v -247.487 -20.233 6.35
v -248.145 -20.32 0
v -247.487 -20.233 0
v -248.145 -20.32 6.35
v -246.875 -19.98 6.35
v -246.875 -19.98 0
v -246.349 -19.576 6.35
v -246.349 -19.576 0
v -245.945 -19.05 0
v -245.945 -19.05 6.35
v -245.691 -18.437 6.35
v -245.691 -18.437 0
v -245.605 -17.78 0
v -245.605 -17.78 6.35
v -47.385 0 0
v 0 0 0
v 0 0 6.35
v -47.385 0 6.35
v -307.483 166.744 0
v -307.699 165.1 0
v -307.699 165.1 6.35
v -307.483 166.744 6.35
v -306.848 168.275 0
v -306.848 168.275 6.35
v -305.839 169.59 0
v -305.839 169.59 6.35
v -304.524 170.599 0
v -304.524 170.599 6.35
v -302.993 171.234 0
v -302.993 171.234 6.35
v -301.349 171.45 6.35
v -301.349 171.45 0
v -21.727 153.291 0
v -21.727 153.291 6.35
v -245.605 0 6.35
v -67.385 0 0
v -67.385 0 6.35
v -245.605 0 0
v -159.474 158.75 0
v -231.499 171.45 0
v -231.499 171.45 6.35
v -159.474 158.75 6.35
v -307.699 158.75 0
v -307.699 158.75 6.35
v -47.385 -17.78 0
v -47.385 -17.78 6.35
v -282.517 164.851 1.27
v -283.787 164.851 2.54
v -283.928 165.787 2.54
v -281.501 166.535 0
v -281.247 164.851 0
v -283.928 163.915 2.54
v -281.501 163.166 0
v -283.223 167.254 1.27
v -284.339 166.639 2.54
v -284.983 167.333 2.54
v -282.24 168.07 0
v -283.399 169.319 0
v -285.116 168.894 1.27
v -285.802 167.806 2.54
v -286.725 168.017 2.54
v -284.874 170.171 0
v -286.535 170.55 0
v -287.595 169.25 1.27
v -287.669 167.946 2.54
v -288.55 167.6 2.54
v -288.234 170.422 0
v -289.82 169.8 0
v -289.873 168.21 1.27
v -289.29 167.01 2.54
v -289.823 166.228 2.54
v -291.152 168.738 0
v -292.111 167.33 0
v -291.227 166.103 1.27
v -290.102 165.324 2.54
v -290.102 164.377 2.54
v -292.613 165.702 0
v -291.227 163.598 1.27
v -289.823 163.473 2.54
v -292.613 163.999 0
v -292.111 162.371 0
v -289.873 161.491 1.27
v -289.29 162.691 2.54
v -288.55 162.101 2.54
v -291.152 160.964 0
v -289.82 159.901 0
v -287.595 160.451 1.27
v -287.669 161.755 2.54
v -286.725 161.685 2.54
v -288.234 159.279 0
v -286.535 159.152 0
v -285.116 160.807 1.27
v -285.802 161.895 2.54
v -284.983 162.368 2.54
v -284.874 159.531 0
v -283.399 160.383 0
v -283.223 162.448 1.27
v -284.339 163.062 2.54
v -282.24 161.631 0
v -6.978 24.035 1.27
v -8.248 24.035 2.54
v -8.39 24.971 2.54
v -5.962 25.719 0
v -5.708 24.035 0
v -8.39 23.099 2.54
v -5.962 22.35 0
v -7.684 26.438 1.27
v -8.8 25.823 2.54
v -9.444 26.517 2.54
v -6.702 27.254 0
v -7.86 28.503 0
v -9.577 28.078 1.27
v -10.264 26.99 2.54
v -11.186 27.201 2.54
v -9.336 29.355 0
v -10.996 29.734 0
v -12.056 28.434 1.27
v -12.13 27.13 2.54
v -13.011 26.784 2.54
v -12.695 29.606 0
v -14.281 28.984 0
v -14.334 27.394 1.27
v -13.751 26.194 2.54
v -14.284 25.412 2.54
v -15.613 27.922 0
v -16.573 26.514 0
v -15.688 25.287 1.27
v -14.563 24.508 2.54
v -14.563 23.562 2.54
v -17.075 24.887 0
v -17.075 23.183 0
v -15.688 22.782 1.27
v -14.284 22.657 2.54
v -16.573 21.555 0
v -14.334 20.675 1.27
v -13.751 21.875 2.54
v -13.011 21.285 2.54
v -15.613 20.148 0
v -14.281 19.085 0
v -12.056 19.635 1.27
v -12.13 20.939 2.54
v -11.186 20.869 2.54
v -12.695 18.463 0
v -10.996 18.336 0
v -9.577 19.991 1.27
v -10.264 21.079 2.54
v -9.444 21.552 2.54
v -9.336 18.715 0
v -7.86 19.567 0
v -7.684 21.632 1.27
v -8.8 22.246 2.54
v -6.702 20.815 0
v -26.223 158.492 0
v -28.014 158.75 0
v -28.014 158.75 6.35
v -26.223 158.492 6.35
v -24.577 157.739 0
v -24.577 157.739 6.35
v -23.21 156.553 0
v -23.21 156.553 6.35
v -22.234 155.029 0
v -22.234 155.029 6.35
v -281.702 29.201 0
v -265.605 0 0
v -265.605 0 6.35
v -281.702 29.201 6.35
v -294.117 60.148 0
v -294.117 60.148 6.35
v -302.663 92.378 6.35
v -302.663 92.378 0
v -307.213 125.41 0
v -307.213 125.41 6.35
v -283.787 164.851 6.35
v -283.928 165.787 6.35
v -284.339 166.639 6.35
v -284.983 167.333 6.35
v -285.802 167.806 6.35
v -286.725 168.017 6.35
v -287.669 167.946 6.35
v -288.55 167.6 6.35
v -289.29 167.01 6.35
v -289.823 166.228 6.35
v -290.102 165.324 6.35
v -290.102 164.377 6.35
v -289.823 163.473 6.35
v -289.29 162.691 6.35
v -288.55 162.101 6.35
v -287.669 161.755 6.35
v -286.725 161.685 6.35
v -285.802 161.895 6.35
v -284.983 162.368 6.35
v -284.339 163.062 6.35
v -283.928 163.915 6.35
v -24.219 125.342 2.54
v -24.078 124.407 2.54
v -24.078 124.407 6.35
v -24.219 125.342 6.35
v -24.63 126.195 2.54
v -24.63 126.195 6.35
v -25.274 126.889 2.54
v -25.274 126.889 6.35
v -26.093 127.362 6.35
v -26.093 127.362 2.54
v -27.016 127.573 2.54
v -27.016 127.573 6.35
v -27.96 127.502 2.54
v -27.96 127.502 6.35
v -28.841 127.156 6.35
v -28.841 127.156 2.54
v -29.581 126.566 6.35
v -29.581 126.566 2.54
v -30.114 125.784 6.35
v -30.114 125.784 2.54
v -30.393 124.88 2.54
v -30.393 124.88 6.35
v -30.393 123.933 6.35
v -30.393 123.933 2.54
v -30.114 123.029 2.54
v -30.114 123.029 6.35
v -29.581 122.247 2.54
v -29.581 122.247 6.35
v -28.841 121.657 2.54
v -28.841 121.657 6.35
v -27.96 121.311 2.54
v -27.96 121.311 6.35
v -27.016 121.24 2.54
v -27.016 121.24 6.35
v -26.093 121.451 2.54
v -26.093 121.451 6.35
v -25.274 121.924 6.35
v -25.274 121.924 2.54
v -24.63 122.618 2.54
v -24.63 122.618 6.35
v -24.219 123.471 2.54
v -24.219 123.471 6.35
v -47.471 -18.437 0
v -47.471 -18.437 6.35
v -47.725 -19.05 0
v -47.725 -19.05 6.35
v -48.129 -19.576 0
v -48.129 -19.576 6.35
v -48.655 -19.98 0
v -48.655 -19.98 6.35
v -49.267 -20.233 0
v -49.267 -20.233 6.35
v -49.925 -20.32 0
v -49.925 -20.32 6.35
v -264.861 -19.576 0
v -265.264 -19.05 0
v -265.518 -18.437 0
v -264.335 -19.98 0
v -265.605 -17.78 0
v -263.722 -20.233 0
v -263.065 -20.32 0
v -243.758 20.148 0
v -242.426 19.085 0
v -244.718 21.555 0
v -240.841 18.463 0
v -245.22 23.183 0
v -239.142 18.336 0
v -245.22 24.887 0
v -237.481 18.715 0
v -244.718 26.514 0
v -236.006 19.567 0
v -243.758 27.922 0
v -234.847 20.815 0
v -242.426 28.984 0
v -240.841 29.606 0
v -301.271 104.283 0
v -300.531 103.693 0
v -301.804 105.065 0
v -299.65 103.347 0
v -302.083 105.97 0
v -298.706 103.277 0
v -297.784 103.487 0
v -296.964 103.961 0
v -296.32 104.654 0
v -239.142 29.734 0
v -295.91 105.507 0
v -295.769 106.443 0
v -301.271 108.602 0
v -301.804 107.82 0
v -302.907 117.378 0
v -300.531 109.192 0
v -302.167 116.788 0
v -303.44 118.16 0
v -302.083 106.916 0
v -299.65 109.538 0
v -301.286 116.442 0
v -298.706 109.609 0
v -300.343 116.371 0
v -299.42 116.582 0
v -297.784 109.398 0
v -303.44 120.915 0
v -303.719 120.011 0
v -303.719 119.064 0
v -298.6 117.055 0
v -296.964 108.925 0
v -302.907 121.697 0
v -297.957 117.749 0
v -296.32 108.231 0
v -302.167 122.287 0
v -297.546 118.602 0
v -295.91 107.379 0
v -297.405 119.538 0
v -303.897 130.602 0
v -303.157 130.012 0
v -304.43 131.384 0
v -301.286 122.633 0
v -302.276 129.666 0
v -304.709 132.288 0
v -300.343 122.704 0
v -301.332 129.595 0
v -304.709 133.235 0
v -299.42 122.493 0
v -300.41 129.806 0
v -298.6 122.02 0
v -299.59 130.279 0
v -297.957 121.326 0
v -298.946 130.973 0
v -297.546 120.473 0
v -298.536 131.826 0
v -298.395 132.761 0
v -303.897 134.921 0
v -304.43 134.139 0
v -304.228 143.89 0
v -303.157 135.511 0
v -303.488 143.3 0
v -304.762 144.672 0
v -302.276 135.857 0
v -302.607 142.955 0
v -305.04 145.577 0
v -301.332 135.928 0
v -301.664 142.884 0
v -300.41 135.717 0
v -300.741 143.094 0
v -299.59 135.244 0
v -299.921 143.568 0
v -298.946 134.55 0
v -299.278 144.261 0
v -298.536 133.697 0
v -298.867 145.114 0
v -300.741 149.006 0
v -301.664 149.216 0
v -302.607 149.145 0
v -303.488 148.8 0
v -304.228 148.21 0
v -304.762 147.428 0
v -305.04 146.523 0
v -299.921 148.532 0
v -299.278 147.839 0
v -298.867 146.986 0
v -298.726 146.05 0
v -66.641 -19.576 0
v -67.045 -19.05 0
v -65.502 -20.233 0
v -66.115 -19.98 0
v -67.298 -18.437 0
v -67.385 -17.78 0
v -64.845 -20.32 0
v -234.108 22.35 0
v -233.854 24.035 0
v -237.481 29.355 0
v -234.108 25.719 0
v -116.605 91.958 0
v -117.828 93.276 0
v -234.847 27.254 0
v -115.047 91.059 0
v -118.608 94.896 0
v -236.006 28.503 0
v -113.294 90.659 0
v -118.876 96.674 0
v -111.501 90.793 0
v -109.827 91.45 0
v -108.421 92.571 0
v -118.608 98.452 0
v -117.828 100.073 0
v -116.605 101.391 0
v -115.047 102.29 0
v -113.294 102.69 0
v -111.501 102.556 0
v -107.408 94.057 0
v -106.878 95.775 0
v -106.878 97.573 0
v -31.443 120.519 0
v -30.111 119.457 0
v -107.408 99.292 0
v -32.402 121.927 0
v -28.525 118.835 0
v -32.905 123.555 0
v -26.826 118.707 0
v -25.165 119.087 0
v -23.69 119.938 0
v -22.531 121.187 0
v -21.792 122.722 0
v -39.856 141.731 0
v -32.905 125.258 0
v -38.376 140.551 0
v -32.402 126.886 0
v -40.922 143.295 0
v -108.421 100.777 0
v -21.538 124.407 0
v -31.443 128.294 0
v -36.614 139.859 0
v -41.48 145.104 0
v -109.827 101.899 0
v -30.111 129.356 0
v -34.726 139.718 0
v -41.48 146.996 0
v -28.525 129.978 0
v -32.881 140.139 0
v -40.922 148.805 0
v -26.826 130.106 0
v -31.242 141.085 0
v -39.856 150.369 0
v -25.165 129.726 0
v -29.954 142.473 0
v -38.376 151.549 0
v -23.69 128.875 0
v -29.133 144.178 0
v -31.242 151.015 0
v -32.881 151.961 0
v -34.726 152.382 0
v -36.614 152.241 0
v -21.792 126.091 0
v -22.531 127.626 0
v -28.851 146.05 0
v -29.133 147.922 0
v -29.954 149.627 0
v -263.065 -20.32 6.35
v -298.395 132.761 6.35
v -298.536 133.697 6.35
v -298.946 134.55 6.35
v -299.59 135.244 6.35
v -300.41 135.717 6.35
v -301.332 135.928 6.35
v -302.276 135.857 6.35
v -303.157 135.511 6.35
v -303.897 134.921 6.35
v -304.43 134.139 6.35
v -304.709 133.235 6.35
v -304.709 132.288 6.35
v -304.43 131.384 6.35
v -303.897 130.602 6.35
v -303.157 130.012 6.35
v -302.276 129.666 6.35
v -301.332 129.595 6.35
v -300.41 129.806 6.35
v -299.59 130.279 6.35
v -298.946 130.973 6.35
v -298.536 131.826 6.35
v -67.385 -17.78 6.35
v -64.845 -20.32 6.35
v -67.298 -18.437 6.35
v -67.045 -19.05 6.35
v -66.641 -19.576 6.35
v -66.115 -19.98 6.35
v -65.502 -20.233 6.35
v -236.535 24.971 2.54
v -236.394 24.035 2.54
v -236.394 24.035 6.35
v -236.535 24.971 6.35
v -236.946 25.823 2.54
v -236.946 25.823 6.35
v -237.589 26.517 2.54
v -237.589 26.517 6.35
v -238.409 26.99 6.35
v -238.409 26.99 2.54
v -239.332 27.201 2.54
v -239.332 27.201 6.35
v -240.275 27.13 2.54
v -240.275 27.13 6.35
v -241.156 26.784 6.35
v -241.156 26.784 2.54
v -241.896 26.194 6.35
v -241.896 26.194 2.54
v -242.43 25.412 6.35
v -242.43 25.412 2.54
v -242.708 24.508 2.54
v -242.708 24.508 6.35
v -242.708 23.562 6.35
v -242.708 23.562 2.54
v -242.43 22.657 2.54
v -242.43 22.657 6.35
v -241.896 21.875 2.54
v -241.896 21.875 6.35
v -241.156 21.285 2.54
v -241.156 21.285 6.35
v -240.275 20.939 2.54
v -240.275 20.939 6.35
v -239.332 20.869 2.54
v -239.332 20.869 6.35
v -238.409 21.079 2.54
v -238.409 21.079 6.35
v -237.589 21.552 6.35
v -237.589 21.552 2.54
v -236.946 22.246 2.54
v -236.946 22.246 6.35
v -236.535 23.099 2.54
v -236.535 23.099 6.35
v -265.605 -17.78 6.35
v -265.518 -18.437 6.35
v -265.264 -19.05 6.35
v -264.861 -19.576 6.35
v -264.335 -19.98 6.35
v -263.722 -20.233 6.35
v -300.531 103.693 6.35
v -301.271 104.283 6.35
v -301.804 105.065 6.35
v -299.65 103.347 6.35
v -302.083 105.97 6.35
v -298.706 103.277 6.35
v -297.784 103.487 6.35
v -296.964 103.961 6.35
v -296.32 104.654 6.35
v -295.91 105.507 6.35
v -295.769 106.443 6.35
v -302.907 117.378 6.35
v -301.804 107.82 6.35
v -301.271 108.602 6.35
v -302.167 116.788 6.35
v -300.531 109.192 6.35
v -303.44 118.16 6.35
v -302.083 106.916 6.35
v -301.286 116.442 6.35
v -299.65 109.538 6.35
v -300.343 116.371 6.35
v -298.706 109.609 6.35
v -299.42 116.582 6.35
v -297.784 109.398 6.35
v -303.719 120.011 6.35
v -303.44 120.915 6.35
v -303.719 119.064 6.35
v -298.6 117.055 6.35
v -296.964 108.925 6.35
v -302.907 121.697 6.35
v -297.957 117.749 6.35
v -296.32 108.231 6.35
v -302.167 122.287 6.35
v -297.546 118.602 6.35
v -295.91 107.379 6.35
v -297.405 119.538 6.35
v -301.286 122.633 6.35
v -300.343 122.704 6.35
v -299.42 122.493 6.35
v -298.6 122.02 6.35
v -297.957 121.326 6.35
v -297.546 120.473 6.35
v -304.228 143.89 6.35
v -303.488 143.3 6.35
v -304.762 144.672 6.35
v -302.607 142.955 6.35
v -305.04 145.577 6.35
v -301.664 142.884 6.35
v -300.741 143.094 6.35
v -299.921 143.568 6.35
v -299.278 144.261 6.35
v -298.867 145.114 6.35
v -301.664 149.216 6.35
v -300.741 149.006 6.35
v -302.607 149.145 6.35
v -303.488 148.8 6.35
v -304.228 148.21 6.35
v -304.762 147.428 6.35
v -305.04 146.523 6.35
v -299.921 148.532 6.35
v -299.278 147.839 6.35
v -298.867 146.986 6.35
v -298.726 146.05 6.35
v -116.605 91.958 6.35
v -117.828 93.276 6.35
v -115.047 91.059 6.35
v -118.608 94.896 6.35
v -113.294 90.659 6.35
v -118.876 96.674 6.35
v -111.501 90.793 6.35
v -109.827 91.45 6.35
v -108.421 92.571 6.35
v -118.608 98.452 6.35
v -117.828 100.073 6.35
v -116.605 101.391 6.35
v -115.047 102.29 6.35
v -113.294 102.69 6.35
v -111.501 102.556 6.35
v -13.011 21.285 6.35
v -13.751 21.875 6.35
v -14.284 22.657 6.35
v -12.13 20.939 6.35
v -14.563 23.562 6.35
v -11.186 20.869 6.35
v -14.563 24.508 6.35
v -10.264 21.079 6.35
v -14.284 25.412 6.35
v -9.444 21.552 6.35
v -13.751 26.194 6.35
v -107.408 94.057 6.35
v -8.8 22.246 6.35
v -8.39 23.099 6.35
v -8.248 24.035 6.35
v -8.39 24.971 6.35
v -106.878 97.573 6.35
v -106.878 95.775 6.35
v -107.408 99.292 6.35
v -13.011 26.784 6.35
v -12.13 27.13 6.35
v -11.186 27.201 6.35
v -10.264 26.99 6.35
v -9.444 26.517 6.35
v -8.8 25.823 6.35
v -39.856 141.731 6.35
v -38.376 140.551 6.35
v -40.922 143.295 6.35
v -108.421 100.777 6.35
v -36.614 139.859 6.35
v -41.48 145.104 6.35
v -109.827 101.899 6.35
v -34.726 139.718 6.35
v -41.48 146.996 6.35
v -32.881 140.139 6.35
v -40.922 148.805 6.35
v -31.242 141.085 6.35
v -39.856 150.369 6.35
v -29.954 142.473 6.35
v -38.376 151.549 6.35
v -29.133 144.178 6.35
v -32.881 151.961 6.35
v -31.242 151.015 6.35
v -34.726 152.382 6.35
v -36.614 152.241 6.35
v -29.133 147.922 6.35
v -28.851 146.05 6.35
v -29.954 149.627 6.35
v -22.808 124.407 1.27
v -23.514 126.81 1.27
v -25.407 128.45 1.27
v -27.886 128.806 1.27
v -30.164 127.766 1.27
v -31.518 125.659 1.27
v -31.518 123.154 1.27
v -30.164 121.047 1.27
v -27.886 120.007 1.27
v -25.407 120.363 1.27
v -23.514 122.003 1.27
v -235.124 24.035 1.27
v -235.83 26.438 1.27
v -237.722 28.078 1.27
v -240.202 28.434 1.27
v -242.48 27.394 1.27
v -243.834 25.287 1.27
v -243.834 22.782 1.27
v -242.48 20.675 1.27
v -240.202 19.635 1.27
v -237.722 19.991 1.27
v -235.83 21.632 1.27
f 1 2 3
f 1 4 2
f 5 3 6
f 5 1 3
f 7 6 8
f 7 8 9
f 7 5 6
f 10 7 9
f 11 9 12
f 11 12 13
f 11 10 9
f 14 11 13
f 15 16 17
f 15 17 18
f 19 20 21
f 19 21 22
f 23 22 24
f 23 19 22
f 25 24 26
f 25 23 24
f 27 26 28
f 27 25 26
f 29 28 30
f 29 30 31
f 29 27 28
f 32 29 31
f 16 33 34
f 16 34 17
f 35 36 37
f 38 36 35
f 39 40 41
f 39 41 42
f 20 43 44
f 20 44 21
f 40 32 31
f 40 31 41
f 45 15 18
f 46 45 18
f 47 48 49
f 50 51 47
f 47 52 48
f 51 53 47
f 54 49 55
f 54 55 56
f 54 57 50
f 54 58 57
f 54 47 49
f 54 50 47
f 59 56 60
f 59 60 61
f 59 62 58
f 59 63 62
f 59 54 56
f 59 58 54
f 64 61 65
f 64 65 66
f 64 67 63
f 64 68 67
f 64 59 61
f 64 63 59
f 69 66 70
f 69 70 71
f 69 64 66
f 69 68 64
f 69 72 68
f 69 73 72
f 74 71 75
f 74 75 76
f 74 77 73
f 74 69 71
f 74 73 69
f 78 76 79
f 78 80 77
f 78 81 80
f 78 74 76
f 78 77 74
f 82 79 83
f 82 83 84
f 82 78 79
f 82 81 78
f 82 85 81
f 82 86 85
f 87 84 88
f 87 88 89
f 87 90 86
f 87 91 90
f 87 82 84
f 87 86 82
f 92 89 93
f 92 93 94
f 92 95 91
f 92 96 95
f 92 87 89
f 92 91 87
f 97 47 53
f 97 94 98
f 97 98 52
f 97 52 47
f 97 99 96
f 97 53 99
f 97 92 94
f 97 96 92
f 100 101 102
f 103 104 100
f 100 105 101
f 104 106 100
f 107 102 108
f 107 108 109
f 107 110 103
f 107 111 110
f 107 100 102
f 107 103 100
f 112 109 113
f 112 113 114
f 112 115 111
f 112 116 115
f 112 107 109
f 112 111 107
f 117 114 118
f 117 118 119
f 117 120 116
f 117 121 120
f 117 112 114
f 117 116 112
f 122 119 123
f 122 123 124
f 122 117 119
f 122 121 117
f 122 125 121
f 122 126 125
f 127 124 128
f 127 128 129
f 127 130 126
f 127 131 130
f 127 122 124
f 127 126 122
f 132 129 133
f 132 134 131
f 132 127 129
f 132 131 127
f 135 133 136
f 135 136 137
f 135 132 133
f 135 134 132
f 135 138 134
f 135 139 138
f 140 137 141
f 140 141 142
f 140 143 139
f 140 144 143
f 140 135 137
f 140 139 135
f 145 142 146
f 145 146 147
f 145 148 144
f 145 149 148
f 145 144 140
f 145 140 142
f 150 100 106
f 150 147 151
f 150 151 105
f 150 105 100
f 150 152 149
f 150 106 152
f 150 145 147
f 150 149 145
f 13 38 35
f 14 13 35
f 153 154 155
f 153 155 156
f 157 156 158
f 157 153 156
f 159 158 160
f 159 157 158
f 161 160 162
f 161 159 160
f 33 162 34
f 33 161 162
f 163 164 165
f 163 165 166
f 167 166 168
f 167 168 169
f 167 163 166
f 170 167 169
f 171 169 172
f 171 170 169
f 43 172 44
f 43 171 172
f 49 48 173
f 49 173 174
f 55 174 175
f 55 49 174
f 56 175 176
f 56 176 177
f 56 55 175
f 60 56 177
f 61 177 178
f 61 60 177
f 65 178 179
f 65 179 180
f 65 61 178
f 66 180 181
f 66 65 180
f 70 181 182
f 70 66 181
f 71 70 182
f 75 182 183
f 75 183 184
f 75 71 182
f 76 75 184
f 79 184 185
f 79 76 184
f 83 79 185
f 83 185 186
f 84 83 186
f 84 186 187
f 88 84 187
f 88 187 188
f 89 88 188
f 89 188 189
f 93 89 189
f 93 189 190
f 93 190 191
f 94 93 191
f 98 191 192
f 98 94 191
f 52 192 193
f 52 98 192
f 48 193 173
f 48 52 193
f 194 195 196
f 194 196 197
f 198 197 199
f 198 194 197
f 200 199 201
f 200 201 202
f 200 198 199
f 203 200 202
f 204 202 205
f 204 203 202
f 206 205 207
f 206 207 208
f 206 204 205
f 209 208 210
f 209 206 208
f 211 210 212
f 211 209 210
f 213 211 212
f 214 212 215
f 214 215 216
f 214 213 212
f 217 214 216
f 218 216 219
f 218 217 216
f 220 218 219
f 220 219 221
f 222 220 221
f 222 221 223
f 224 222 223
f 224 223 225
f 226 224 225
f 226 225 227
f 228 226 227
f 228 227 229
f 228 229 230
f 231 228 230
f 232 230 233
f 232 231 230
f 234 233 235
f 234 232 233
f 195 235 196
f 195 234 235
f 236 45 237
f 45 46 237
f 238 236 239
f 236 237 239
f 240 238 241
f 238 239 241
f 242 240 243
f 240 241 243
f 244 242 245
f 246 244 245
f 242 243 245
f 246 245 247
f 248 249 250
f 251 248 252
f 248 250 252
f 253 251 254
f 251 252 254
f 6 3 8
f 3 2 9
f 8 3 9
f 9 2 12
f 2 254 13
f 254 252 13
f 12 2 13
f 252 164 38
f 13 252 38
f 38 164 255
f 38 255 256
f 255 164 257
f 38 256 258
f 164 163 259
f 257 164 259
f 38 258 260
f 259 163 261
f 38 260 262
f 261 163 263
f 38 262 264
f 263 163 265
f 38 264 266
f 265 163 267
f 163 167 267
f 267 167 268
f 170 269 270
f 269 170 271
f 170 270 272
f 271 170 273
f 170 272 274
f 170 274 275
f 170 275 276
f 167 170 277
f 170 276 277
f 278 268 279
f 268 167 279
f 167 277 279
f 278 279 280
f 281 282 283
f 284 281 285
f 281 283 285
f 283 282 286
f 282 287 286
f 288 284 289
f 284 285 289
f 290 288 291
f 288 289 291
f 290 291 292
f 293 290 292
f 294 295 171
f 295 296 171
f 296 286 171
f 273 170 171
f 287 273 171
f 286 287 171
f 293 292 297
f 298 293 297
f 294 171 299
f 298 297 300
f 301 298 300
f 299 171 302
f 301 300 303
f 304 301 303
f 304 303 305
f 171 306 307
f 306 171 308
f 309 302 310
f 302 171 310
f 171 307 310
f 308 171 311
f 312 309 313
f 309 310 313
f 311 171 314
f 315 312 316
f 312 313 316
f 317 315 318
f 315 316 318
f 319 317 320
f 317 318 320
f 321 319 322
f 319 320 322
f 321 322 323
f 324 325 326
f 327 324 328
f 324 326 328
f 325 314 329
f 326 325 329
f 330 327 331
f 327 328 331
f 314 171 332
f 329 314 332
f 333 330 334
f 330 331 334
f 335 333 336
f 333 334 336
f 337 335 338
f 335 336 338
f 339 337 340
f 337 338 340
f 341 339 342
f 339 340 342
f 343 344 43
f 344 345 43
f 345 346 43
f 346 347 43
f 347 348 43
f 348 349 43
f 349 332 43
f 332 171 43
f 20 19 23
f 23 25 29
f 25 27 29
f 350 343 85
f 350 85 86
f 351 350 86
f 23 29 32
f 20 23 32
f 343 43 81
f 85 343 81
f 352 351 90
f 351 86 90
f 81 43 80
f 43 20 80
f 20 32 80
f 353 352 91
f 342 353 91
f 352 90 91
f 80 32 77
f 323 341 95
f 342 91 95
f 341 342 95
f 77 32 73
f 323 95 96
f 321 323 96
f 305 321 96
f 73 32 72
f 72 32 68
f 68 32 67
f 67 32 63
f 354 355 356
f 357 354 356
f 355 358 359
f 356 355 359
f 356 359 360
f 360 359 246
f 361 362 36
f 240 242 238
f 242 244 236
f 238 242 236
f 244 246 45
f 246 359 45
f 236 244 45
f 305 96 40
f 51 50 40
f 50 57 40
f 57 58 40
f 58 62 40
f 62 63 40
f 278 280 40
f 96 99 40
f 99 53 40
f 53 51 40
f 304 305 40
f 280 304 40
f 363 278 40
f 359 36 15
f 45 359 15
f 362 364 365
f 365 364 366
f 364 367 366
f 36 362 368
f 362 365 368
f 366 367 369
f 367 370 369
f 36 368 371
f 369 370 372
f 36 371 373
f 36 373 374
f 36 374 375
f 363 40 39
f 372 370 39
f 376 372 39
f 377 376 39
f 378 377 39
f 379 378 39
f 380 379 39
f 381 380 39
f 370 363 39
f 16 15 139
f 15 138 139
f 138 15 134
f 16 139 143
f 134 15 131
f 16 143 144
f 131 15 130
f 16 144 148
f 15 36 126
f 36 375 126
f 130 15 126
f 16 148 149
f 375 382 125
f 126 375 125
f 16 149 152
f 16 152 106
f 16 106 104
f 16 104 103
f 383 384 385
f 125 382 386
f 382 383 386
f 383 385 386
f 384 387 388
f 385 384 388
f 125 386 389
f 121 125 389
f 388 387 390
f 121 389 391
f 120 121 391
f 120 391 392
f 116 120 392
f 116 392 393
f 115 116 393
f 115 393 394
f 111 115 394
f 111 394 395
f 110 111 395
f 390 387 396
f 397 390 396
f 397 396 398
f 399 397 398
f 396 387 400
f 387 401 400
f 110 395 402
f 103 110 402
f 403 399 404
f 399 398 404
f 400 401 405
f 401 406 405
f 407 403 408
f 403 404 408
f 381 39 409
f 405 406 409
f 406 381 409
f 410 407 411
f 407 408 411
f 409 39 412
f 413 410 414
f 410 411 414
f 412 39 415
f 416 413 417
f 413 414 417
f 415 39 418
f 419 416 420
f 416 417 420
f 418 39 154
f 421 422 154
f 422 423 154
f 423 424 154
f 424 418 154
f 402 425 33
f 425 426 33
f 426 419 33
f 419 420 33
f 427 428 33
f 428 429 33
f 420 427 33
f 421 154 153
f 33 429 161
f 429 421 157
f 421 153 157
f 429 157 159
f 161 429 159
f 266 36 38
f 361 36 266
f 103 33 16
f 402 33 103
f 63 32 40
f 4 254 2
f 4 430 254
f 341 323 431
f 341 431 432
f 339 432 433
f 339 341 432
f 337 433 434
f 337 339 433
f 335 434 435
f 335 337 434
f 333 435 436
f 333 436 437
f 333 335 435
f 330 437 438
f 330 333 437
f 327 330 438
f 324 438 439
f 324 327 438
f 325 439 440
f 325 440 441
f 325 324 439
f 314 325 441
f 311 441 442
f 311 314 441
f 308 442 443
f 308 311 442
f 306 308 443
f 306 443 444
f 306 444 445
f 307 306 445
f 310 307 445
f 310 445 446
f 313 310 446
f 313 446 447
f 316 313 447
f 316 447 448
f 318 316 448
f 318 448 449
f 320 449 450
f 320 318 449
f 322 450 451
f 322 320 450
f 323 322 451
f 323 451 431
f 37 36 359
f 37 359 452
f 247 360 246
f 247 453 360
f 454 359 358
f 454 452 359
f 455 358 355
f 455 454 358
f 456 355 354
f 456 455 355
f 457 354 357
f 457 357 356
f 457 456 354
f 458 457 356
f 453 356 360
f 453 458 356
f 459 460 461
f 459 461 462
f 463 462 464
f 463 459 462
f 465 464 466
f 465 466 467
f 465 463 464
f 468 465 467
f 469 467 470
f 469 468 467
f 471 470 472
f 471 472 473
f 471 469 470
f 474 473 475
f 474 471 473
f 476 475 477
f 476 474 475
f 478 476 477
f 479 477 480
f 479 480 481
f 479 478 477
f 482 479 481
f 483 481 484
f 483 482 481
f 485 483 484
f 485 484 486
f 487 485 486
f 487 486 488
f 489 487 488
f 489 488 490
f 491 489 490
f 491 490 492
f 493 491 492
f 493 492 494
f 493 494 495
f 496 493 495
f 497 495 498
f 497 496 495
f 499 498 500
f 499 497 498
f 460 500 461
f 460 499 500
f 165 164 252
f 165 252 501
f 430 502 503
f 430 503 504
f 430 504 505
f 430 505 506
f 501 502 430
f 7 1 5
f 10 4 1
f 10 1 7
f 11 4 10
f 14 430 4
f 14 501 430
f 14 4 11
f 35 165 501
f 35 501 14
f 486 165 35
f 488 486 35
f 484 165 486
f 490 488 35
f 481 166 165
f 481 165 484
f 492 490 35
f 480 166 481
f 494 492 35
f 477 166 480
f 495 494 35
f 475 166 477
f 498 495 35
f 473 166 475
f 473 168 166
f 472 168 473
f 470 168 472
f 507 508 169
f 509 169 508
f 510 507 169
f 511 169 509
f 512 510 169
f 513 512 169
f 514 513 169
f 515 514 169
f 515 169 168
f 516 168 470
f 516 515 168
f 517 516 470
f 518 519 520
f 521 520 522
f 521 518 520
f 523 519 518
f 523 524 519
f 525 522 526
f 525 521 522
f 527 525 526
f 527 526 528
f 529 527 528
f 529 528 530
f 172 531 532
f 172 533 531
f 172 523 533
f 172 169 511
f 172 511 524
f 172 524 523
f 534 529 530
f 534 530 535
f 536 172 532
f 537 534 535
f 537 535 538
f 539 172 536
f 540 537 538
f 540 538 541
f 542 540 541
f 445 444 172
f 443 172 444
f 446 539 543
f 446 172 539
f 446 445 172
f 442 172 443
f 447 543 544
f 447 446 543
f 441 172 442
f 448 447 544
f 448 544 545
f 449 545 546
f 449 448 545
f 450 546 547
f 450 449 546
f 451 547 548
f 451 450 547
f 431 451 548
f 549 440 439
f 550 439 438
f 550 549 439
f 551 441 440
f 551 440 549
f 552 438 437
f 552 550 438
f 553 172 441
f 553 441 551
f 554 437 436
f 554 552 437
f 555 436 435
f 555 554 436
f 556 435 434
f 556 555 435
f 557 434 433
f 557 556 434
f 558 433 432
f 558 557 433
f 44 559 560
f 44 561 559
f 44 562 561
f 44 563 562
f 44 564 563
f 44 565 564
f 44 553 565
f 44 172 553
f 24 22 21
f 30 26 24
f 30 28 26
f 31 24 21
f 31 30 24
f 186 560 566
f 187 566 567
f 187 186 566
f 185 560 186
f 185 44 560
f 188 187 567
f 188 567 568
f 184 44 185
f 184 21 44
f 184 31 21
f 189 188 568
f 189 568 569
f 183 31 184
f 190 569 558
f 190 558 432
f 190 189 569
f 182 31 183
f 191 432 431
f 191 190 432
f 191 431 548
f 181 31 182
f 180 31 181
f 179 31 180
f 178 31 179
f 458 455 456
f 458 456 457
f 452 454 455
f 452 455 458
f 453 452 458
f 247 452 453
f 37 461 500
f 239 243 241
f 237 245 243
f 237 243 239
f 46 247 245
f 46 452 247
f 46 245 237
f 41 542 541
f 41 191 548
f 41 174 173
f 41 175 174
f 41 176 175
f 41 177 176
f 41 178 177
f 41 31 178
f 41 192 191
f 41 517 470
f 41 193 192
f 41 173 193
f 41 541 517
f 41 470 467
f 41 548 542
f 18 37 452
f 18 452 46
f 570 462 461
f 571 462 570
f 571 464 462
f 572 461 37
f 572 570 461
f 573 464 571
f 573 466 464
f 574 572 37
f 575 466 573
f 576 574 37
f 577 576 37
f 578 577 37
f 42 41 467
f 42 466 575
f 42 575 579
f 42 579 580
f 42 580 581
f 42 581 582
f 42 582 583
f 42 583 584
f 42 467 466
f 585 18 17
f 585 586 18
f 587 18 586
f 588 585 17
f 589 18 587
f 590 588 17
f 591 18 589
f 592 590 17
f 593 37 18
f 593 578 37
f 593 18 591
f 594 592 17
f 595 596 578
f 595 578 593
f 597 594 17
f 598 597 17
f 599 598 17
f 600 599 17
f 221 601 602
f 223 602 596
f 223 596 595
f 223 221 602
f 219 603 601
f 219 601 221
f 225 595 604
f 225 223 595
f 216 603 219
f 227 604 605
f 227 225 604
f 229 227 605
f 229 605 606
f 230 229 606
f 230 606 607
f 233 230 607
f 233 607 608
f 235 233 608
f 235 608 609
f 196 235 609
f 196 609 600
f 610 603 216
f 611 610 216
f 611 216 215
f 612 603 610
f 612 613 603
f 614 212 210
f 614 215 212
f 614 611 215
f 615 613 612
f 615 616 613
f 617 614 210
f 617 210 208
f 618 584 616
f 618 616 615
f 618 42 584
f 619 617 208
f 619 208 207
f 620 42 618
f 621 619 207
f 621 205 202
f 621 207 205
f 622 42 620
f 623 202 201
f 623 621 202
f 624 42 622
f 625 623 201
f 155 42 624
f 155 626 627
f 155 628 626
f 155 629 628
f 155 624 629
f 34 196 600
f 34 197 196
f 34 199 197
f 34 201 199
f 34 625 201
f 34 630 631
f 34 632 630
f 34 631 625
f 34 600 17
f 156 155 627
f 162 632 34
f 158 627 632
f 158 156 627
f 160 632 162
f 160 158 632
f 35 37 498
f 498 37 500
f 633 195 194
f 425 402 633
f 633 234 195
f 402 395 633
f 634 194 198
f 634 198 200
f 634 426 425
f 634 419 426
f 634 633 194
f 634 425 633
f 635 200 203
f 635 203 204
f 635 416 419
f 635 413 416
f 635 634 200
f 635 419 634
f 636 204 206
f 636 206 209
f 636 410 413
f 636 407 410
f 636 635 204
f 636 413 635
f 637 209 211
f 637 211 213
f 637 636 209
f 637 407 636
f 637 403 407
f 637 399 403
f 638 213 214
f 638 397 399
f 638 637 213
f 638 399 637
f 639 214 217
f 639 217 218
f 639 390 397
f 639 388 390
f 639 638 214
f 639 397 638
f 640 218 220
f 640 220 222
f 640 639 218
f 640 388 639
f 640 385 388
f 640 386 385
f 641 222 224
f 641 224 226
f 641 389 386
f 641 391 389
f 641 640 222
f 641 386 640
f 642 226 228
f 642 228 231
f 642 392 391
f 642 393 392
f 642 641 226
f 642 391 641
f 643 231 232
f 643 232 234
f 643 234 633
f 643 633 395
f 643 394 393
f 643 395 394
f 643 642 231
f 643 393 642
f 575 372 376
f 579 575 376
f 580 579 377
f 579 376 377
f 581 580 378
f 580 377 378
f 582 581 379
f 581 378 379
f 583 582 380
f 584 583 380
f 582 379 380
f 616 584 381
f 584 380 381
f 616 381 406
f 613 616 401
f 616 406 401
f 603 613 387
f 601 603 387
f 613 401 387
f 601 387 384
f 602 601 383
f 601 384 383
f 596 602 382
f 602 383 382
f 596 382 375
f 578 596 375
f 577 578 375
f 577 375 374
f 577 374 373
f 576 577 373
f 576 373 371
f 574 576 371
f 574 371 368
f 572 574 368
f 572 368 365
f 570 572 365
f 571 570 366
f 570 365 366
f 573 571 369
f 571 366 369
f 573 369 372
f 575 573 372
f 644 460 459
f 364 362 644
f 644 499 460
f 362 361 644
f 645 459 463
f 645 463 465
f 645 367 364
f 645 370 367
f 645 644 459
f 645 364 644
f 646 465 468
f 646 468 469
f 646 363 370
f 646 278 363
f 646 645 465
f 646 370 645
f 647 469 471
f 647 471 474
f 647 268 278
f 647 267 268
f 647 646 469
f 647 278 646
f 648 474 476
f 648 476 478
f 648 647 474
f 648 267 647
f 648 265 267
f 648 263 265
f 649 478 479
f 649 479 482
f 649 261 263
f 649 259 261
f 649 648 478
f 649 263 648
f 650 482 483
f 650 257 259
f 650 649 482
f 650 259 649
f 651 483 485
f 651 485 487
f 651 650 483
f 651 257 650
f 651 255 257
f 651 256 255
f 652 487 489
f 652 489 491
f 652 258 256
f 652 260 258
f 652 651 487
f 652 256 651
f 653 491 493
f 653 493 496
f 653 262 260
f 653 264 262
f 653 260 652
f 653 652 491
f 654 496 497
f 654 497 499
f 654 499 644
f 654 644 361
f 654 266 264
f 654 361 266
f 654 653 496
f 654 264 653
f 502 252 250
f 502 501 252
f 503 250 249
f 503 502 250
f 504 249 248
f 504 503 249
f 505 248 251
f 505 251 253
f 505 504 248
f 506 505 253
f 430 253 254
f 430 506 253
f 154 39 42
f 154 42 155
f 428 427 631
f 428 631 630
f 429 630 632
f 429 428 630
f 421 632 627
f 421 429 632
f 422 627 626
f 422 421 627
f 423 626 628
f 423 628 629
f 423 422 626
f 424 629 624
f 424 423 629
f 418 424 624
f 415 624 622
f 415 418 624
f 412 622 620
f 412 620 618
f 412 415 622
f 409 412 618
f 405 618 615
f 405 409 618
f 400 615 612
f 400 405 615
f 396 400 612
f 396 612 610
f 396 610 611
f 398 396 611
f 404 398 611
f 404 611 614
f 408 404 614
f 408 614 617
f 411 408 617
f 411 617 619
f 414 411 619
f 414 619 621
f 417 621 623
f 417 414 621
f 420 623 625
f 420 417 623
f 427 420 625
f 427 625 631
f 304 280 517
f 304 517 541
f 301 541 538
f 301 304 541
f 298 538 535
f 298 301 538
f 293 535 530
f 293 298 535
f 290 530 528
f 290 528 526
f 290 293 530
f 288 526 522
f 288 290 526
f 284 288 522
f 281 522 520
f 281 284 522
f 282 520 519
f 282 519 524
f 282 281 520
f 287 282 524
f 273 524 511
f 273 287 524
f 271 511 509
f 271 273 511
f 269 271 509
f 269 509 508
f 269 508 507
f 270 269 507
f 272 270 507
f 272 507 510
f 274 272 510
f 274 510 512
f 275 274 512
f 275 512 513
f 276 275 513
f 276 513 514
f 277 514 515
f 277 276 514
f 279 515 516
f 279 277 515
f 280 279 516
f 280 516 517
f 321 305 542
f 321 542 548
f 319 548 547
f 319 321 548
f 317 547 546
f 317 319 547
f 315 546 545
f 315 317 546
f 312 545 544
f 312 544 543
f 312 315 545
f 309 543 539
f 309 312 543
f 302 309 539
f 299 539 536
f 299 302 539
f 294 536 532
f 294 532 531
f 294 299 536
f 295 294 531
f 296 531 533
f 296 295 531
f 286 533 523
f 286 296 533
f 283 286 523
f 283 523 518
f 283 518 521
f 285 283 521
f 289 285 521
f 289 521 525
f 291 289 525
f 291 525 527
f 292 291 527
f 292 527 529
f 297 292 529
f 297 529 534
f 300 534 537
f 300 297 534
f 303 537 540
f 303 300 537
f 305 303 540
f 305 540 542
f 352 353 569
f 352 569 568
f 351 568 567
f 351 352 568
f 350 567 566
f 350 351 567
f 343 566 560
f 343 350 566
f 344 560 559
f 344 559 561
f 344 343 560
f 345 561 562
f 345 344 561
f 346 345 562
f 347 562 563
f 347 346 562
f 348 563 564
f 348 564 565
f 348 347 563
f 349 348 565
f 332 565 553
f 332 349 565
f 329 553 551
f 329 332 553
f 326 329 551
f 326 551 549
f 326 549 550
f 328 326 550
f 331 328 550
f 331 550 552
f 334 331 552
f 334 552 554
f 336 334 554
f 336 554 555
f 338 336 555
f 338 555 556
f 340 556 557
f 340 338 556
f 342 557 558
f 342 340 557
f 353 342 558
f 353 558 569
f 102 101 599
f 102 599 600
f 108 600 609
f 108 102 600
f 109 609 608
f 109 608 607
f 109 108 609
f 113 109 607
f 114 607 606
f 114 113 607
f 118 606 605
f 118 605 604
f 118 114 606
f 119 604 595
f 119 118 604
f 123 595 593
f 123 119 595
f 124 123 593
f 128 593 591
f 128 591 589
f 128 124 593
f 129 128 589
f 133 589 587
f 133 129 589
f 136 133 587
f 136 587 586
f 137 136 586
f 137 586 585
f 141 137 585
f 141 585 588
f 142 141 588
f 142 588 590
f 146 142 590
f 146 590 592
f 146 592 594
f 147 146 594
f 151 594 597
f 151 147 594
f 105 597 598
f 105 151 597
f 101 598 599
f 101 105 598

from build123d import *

# Parameters (mm, degrees)
SKETCH18_R          = 1.905
SKETCH18_R_2        = 3.175
SKETCH18_R_3        = 6.35
SKETCH18_R_4        = 2.5
SKETCH18_R_5        = 10.922
BOSS_EXTRUDE4_DEPTH = 6.35
CHAMFER1_SIZE       = 2.54
SKETCH19_R          = 32.808821981
BOSS_EXTRUDE5_DEPTH = 6.35
SKETCH20_R          = 6.0325
CUT_EXTRUDE1_DEPTH  = 6.35
SKETCH22_W          = 20
SKETCH22_H          = 6.35
BOSS_EXTRUDE6_DEPTH = 20.32
FILLET1_R           = 2.54


with BuildPart() as part:
    # Sketch18 → Boss-Extrude4 (new body)
    with BuildSketch(Plane.XY):
        with BuildLine():
            Line((0, 0), (-265.604745697, 0))
            ThreePointArc((-265.604745697, 0), (-298.882523776, 76.131915965), (-307.699061234, 158.75))
            Line((-307.699061234, 158.75), (-307.699061234, 165.1))
            ThreePointArc((-307.699061234, 165.1), (-305.839189294, 169.590128061), (-301.349061234, 171.45))
            Line((-301.349061234, 171.45), (-231.499061234, 171.45))
            Line((-231.499061234, 171.45), (-159.473782125, 158.75))
            Line((-159.473782125, 158.75), (-28.014368889, 158.75))
            ThreePointArc((-28.014368889, 158.75), (-23.851207857, 157.194850386), (-21.727208485, 153.291130779))
            Line((-21.727208485, 153.291130779), (0, 0))
        make_face()
        with Locations((-180.594, 136.144)):
            Circle(SKETCH18_R, mode=Mode.SUBTRACT)
        with Locations((-11.423473622, 24.034728138)):
            Circle(SKETCH18_R_2, mode=Mode.SUBTRACT)
        with Locations((-27.253356194, 124.406511892)):
            Circle(SKETCH18_R_2, mode=Mode.SUBTRACT)
        with Locations((-35.200938766, 146.05)):
            Circle(SKETCH18_R_3, mode=Mode.SUBTRACT)
        with Locations((-301.900938766, 146.05)):
            Circle(SKETCH18_R_2, mode=Mode.SUBTRACT)
        with Locations((-301.569673588, 132.761391752)):
            Circle(SKETCH18_R_2, mode=Mode.SUBTRACT)
        with Locations((-300.579872803, 119.537524267)):
            Circle(SKETCH18_R_2, mode=Mode.SUBTRACT)
        with Locations((-298.943543444, 106.442822899)):
            Circle(SKETCH18_R_2, mode=Mode.SUBTRACT)
        with Locations((-239.568937637, 24.034728138)):
            Circle(SKETCH18_R_2, mode=Mode.SUBTRACT)
        with Locations((-286.962142025, 164.850708953)):
            Circle(SKETCH18_R_2, mode=Mode.SUBTRACT)
        with Locations((-187.097045256, 107.95)):
            Circle(SKETCH18_R_4, mode=Mode.SUBTRACT)
        with Locations((-180.594, 105.156)):
            Circle(SKETCH18_R, mode=Mode.SUBTRACT)
        with Locations((-165.1, 120.65)):
            Circle(SKETCH18_R_5, mode=Mode.SUBTRACT)
        with Locations((-165.1, 146.05)):
            Circle(SKETCH18_R_4, mode=Mode.SUBTRACT)
        with Locations((-149.606, 105.156)):
            Circle(SKETCH18_R, mode=Mode.SUBTRACT)
        with Locations((-149.606, 136.144)):
            Circle(SKETCH18_R, mode=Mode.SUBTRACT)
        with Locations((-143.102954744, 107.95)):
            Circle(SKETCH18_R_4, mode=Mode.SUBTRACT)
    extrude(amount=BOSS_EXTRUDE4_DEPTH)

    # Chamfer1
    chamfer1_edges = [part.edges().sort_by_distance(p)[0] for p in [
        (-14.598473622, 24.034728138, 0),
        (-30.428356194, 124.406511892, 0),
        (-242.743937637, 24.034728138, 0),
        (-290.137142025, 164.850708953, 0),
    ]]
    chamfer(chamfer1_edges, length=CHAMFER1_SIZE)

    # Sketch19 → Boss-Extrude5 (add)
    with BuildSketch(Plane(origin=(0, 0, 0), x_dir=(-1, 0, 0), z_dir=(0, 0, -1))):
        with Locations((165.1, 120.65)):
            Circle(SKETCH19_R)
    extrude(amount=-BOSS_EXTRUDE5_DEPTH)

    # Sketch20 → Cut-Extrude1 (cut)
    with BuildSketch(Plane(origin=(0, 0, 0), x_dir=(-1, 0, 0), z_dir=(0, 0, -1))):
        with Locations((112.843509564, 96.674296134)):
            Circle(SKETCH20_R)
    extrude(amount=-CUT_EXTRUDE1_DEPTH, mode=Mode.SUBTRACT)

    # Sketch22 → Boss-Extrude6 (add)
    with BuildSketch(Plane.XZ):
        with Locations((-57.384832148, 3.175)):
            Rectangle(SKETCH22_W, SKETCH22_H)
        with Locations((-255.604745697, 3.175)):
            Rectangle(SKETCH22_W, SKETCH22_H)
    extrude(amount=BOSS_EXTRUDE6_DEPTH)

    # Fillet1
    fillet1_edges = [part.edges().sort_by_distance(p)[0] for p in [
        (-67.384832148, -20.32, 3.175),
        (-47.384832148, -20.32, 3.175),
        (-265.604745697, -20.32, 3.175),
        (-245.604745697, -20.32, 3.175),
    ]]
    fillet(fillet1_edges, radius=FILLET1_R)


solid = part.part
